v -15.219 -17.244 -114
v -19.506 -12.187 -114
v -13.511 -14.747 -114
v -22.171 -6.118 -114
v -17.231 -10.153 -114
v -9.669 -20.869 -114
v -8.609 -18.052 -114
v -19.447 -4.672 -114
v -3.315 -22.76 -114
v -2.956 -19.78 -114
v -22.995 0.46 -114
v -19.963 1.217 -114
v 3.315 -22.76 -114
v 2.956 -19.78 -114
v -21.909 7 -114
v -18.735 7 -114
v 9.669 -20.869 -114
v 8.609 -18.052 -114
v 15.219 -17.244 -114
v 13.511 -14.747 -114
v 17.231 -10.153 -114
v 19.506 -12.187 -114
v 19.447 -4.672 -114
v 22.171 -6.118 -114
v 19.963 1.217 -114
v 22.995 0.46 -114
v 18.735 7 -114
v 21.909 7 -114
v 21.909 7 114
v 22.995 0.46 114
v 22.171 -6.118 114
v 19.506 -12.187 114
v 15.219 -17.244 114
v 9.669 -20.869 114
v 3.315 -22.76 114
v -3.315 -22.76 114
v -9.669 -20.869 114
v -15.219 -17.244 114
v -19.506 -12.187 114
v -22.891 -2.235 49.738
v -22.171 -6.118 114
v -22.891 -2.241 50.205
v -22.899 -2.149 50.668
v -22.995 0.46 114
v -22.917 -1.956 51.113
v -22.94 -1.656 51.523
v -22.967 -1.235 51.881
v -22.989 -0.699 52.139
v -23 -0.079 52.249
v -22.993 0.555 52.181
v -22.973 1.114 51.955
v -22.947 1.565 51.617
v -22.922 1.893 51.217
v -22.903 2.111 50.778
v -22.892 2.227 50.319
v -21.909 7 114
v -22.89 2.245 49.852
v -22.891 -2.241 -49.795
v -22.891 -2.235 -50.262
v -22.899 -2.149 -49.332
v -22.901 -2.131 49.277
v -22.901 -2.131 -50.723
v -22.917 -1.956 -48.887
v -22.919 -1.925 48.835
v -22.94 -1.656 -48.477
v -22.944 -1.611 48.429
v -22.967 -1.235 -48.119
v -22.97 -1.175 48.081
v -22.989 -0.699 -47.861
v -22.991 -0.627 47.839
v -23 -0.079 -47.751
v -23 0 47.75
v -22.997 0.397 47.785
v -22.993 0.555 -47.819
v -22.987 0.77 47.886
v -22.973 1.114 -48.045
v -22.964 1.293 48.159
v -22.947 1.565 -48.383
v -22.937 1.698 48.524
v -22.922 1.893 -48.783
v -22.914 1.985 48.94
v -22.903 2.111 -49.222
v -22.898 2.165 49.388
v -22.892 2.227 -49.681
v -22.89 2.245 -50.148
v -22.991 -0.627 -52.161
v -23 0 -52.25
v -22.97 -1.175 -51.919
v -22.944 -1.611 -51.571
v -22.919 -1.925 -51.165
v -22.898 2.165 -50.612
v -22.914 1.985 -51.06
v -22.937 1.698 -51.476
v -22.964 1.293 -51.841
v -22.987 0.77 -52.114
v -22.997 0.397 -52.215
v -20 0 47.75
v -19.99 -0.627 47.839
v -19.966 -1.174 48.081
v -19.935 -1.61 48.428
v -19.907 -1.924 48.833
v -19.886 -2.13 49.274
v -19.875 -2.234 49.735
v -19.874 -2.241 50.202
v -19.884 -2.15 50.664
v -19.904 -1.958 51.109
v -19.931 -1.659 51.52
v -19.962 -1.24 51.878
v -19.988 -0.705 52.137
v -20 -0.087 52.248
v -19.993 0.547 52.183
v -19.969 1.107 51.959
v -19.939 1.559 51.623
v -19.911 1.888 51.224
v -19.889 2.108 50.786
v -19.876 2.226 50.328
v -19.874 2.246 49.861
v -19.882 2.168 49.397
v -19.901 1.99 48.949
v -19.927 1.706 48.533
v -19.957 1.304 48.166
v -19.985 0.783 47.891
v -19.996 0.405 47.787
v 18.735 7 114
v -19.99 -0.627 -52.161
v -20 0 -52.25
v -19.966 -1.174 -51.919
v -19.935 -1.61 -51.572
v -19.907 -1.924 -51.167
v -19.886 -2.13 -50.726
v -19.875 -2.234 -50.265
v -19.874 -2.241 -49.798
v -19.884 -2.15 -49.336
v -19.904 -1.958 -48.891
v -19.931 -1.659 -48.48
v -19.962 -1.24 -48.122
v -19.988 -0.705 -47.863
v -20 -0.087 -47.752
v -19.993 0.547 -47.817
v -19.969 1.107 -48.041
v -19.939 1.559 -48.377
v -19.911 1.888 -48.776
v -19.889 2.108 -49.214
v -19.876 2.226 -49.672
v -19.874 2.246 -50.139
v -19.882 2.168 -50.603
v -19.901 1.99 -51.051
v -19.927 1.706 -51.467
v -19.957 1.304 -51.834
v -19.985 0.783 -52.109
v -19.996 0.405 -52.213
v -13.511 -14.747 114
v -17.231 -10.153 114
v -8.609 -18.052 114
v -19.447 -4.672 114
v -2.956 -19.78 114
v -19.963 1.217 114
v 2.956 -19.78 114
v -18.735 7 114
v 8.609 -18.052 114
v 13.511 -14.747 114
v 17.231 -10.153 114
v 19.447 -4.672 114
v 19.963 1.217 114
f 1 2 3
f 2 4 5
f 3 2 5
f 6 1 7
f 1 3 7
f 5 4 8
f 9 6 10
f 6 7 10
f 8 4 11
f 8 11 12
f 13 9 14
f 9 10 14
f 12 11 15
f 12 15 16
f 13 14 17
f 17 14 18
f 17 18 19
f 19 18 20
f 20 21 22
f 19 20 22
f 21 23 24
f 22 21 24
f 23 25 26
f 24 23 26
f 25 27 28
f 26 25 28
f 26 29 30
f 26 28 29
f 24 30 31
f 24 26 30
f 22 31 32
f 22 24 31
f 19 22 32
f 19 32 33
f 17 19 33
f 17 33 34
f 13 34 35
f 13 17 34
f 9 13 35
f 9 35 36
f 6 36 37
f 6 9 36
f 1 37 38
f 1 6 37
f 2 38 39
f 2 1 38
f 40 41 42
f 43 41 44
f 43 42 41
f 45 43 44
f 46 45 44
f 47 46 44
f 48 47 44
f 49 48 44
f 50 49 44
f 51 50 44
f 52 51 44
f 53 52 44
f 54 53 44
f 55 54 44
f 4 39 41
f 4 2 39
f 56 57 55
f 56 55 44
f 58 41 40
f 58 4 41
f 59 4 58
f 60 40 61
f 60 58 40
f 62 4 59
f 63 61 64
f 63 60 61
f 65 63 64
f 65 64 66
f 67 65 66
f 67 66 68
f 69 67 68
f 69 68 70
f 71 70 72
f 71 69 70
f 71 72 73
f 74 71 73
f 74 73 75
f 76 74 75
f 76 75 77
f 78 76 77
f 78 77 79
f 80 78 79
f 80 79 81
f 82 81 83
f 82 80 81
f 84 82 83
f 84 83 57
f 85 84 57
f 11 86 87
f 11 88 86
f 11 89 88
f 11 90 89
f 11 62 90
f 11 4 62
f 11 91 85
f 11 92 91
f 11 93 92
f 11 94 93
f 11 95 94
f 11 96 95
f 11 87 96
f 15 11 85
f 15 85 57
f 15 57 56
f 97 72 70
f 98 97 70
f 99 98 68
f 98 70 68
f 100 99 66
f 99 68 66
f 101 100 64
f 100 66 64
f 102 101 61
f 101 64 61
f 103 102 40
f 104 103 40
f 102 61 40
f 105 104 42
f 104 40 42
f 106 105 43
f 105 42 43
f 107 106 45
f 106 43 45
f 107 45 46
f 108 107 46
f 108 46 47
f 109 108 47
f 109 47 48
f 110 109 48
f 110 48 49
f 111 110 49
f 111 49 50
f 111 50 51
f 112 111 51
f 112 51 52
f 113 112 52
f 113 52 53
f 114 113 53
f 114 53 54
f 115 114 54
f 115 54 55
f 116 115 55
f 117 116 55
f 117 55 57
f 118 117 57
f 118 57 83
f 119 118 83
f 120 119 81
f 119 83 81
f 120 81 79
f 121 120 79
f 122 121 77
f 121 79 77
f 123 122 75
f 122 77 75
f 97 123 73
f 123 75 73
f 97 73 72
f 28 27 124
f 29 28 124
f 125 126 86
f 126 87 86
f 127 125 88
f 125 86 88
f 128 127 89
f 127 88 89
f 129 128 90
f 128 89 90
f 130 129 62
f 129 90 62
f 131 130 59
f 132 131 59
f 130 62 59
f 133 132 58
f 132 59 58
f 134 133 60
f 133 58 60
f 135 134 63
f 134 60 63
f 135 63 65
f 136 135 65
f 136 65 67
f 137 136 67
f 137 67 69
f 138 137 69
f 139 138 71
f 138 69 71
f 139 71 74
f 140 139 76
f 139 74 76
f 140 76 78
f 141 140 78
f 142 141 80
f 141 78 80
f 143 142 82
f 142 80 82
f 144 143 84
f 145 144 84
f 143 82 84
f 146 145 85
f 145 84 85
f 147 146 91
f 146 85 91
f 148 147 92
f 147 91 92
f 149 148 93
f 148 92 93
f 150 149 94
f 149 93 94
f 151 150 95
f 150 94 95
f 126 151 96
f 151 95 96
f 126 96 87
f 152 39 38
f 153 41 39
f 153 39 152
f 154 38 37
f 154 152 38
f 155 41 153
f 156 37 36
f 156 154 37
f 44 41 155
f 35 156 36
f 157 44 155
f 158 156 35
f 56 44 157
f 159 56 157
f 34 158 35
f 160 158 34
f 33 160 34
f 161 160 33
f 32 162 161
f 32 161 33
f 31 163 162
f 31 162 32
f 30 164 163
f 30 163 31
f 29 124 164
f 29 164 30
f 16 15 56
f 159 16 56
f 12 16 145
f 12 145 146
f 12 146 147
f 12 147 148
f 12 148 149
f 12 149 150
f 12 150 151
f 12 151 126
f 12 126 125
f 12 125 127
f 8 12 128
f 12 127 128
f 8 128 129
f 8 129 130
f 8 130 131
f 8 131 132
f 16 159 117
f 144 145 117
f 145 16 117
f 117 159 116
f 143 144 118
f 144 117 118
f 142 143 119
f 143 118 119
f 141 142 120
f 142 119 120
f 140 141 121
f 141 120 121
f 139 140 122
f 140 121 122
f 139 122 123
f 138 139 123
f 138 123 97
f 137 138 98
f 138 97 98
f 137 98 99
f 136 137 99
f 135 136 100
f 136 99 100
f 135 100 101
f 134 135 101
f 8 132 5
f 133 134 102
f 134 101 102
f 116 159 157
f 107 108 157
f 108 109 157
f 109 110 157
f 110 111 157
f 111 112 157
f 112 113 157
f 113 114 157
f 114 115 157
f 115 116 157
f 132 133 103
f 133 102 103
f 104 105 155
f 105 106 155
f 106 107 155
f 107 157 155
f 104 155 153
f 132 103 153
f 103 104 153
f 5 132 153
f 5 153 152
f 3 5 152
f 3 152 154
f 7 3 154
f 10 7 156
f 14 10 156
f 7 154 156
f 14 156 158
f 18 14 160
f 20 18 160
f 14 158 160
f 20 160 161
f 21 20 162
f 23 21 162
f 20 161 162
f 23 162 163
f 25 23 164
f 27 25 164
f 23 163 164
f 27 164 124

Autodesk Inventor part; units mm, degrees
ref_plane "YZ Plane" through (0, 0, 0) normal (1, 0, 0) x (0, 1, 0)
ref_plane "XZ Plane" through (0, 0, 0) normal (0, 1, 0) x (-1, 0, 0)
ref_plane "XY Plane" through (0, 0, 0) normal (0, 0, 1) x (1, 0, 0)
sketch "Sketch1" plane through (0, 0, 0) normal (0, 0, 1) x (1, 0, 0)
  circle A0 centre (0, 0) radius 20
  circle A1 centre (0, 0) radius 23
  dimension "d0" = 40
  dimension "d1" = 46
extrude "Extrusion1" add sketch "Sketch1" along normal mid plane 228
sketch "Sketch2" plane through (0, 0, 0) normal (1, 0, 0) x (0, 1, 0)
  line L0 (0, 70) -> (0, -70) projected
  line L1 (-70, 0) -> (70, 0) projected
  point P0 (0, 0)
  point P1 (0, 50)
  point P2 (0, -50)
  dimension "d19" = 50
  dimension "d20" = 100
hole "Hole1" at (0, 0, 50) at (0, 0, -50) direction (-1, 0, 0) diameter 4.5 end through all clearance for "Flat Head Machine Screw" size "M4" standard "Ansi Metric M Profile"
sketch "Sketch3" plane through (0, 0, 0) normal (1, 0, 0) x (0, 1, 0)
  line L0 (23, -114) -> (7, -114)
  line L1 (7, -114) -> (7, 114)
  line L2 (7, 114) -> (23, 114)
  line L3 (23, 114) -> (23, -114)
  line L4 (23, 114) -> (-23, 114) projected
  line L5 (-23, -114) -> (23, -114) projected
  line L6 (0, 160.3) -> (0, -160.3) projected
  point P0 (0, 0)
  dimension "d13" = 0
  dimension "d14" = 0
  dimension "d15" = 7
extrude "Extrusion2" cut sketch "Sketch3" along normal through all both and the other way through all contours L0 L1 L2 L3
equation "\"d19\" = 0.5 * d20"
properties part number "Top_Tilt Pipe_4 Lanes" material "PVC-Piping"
